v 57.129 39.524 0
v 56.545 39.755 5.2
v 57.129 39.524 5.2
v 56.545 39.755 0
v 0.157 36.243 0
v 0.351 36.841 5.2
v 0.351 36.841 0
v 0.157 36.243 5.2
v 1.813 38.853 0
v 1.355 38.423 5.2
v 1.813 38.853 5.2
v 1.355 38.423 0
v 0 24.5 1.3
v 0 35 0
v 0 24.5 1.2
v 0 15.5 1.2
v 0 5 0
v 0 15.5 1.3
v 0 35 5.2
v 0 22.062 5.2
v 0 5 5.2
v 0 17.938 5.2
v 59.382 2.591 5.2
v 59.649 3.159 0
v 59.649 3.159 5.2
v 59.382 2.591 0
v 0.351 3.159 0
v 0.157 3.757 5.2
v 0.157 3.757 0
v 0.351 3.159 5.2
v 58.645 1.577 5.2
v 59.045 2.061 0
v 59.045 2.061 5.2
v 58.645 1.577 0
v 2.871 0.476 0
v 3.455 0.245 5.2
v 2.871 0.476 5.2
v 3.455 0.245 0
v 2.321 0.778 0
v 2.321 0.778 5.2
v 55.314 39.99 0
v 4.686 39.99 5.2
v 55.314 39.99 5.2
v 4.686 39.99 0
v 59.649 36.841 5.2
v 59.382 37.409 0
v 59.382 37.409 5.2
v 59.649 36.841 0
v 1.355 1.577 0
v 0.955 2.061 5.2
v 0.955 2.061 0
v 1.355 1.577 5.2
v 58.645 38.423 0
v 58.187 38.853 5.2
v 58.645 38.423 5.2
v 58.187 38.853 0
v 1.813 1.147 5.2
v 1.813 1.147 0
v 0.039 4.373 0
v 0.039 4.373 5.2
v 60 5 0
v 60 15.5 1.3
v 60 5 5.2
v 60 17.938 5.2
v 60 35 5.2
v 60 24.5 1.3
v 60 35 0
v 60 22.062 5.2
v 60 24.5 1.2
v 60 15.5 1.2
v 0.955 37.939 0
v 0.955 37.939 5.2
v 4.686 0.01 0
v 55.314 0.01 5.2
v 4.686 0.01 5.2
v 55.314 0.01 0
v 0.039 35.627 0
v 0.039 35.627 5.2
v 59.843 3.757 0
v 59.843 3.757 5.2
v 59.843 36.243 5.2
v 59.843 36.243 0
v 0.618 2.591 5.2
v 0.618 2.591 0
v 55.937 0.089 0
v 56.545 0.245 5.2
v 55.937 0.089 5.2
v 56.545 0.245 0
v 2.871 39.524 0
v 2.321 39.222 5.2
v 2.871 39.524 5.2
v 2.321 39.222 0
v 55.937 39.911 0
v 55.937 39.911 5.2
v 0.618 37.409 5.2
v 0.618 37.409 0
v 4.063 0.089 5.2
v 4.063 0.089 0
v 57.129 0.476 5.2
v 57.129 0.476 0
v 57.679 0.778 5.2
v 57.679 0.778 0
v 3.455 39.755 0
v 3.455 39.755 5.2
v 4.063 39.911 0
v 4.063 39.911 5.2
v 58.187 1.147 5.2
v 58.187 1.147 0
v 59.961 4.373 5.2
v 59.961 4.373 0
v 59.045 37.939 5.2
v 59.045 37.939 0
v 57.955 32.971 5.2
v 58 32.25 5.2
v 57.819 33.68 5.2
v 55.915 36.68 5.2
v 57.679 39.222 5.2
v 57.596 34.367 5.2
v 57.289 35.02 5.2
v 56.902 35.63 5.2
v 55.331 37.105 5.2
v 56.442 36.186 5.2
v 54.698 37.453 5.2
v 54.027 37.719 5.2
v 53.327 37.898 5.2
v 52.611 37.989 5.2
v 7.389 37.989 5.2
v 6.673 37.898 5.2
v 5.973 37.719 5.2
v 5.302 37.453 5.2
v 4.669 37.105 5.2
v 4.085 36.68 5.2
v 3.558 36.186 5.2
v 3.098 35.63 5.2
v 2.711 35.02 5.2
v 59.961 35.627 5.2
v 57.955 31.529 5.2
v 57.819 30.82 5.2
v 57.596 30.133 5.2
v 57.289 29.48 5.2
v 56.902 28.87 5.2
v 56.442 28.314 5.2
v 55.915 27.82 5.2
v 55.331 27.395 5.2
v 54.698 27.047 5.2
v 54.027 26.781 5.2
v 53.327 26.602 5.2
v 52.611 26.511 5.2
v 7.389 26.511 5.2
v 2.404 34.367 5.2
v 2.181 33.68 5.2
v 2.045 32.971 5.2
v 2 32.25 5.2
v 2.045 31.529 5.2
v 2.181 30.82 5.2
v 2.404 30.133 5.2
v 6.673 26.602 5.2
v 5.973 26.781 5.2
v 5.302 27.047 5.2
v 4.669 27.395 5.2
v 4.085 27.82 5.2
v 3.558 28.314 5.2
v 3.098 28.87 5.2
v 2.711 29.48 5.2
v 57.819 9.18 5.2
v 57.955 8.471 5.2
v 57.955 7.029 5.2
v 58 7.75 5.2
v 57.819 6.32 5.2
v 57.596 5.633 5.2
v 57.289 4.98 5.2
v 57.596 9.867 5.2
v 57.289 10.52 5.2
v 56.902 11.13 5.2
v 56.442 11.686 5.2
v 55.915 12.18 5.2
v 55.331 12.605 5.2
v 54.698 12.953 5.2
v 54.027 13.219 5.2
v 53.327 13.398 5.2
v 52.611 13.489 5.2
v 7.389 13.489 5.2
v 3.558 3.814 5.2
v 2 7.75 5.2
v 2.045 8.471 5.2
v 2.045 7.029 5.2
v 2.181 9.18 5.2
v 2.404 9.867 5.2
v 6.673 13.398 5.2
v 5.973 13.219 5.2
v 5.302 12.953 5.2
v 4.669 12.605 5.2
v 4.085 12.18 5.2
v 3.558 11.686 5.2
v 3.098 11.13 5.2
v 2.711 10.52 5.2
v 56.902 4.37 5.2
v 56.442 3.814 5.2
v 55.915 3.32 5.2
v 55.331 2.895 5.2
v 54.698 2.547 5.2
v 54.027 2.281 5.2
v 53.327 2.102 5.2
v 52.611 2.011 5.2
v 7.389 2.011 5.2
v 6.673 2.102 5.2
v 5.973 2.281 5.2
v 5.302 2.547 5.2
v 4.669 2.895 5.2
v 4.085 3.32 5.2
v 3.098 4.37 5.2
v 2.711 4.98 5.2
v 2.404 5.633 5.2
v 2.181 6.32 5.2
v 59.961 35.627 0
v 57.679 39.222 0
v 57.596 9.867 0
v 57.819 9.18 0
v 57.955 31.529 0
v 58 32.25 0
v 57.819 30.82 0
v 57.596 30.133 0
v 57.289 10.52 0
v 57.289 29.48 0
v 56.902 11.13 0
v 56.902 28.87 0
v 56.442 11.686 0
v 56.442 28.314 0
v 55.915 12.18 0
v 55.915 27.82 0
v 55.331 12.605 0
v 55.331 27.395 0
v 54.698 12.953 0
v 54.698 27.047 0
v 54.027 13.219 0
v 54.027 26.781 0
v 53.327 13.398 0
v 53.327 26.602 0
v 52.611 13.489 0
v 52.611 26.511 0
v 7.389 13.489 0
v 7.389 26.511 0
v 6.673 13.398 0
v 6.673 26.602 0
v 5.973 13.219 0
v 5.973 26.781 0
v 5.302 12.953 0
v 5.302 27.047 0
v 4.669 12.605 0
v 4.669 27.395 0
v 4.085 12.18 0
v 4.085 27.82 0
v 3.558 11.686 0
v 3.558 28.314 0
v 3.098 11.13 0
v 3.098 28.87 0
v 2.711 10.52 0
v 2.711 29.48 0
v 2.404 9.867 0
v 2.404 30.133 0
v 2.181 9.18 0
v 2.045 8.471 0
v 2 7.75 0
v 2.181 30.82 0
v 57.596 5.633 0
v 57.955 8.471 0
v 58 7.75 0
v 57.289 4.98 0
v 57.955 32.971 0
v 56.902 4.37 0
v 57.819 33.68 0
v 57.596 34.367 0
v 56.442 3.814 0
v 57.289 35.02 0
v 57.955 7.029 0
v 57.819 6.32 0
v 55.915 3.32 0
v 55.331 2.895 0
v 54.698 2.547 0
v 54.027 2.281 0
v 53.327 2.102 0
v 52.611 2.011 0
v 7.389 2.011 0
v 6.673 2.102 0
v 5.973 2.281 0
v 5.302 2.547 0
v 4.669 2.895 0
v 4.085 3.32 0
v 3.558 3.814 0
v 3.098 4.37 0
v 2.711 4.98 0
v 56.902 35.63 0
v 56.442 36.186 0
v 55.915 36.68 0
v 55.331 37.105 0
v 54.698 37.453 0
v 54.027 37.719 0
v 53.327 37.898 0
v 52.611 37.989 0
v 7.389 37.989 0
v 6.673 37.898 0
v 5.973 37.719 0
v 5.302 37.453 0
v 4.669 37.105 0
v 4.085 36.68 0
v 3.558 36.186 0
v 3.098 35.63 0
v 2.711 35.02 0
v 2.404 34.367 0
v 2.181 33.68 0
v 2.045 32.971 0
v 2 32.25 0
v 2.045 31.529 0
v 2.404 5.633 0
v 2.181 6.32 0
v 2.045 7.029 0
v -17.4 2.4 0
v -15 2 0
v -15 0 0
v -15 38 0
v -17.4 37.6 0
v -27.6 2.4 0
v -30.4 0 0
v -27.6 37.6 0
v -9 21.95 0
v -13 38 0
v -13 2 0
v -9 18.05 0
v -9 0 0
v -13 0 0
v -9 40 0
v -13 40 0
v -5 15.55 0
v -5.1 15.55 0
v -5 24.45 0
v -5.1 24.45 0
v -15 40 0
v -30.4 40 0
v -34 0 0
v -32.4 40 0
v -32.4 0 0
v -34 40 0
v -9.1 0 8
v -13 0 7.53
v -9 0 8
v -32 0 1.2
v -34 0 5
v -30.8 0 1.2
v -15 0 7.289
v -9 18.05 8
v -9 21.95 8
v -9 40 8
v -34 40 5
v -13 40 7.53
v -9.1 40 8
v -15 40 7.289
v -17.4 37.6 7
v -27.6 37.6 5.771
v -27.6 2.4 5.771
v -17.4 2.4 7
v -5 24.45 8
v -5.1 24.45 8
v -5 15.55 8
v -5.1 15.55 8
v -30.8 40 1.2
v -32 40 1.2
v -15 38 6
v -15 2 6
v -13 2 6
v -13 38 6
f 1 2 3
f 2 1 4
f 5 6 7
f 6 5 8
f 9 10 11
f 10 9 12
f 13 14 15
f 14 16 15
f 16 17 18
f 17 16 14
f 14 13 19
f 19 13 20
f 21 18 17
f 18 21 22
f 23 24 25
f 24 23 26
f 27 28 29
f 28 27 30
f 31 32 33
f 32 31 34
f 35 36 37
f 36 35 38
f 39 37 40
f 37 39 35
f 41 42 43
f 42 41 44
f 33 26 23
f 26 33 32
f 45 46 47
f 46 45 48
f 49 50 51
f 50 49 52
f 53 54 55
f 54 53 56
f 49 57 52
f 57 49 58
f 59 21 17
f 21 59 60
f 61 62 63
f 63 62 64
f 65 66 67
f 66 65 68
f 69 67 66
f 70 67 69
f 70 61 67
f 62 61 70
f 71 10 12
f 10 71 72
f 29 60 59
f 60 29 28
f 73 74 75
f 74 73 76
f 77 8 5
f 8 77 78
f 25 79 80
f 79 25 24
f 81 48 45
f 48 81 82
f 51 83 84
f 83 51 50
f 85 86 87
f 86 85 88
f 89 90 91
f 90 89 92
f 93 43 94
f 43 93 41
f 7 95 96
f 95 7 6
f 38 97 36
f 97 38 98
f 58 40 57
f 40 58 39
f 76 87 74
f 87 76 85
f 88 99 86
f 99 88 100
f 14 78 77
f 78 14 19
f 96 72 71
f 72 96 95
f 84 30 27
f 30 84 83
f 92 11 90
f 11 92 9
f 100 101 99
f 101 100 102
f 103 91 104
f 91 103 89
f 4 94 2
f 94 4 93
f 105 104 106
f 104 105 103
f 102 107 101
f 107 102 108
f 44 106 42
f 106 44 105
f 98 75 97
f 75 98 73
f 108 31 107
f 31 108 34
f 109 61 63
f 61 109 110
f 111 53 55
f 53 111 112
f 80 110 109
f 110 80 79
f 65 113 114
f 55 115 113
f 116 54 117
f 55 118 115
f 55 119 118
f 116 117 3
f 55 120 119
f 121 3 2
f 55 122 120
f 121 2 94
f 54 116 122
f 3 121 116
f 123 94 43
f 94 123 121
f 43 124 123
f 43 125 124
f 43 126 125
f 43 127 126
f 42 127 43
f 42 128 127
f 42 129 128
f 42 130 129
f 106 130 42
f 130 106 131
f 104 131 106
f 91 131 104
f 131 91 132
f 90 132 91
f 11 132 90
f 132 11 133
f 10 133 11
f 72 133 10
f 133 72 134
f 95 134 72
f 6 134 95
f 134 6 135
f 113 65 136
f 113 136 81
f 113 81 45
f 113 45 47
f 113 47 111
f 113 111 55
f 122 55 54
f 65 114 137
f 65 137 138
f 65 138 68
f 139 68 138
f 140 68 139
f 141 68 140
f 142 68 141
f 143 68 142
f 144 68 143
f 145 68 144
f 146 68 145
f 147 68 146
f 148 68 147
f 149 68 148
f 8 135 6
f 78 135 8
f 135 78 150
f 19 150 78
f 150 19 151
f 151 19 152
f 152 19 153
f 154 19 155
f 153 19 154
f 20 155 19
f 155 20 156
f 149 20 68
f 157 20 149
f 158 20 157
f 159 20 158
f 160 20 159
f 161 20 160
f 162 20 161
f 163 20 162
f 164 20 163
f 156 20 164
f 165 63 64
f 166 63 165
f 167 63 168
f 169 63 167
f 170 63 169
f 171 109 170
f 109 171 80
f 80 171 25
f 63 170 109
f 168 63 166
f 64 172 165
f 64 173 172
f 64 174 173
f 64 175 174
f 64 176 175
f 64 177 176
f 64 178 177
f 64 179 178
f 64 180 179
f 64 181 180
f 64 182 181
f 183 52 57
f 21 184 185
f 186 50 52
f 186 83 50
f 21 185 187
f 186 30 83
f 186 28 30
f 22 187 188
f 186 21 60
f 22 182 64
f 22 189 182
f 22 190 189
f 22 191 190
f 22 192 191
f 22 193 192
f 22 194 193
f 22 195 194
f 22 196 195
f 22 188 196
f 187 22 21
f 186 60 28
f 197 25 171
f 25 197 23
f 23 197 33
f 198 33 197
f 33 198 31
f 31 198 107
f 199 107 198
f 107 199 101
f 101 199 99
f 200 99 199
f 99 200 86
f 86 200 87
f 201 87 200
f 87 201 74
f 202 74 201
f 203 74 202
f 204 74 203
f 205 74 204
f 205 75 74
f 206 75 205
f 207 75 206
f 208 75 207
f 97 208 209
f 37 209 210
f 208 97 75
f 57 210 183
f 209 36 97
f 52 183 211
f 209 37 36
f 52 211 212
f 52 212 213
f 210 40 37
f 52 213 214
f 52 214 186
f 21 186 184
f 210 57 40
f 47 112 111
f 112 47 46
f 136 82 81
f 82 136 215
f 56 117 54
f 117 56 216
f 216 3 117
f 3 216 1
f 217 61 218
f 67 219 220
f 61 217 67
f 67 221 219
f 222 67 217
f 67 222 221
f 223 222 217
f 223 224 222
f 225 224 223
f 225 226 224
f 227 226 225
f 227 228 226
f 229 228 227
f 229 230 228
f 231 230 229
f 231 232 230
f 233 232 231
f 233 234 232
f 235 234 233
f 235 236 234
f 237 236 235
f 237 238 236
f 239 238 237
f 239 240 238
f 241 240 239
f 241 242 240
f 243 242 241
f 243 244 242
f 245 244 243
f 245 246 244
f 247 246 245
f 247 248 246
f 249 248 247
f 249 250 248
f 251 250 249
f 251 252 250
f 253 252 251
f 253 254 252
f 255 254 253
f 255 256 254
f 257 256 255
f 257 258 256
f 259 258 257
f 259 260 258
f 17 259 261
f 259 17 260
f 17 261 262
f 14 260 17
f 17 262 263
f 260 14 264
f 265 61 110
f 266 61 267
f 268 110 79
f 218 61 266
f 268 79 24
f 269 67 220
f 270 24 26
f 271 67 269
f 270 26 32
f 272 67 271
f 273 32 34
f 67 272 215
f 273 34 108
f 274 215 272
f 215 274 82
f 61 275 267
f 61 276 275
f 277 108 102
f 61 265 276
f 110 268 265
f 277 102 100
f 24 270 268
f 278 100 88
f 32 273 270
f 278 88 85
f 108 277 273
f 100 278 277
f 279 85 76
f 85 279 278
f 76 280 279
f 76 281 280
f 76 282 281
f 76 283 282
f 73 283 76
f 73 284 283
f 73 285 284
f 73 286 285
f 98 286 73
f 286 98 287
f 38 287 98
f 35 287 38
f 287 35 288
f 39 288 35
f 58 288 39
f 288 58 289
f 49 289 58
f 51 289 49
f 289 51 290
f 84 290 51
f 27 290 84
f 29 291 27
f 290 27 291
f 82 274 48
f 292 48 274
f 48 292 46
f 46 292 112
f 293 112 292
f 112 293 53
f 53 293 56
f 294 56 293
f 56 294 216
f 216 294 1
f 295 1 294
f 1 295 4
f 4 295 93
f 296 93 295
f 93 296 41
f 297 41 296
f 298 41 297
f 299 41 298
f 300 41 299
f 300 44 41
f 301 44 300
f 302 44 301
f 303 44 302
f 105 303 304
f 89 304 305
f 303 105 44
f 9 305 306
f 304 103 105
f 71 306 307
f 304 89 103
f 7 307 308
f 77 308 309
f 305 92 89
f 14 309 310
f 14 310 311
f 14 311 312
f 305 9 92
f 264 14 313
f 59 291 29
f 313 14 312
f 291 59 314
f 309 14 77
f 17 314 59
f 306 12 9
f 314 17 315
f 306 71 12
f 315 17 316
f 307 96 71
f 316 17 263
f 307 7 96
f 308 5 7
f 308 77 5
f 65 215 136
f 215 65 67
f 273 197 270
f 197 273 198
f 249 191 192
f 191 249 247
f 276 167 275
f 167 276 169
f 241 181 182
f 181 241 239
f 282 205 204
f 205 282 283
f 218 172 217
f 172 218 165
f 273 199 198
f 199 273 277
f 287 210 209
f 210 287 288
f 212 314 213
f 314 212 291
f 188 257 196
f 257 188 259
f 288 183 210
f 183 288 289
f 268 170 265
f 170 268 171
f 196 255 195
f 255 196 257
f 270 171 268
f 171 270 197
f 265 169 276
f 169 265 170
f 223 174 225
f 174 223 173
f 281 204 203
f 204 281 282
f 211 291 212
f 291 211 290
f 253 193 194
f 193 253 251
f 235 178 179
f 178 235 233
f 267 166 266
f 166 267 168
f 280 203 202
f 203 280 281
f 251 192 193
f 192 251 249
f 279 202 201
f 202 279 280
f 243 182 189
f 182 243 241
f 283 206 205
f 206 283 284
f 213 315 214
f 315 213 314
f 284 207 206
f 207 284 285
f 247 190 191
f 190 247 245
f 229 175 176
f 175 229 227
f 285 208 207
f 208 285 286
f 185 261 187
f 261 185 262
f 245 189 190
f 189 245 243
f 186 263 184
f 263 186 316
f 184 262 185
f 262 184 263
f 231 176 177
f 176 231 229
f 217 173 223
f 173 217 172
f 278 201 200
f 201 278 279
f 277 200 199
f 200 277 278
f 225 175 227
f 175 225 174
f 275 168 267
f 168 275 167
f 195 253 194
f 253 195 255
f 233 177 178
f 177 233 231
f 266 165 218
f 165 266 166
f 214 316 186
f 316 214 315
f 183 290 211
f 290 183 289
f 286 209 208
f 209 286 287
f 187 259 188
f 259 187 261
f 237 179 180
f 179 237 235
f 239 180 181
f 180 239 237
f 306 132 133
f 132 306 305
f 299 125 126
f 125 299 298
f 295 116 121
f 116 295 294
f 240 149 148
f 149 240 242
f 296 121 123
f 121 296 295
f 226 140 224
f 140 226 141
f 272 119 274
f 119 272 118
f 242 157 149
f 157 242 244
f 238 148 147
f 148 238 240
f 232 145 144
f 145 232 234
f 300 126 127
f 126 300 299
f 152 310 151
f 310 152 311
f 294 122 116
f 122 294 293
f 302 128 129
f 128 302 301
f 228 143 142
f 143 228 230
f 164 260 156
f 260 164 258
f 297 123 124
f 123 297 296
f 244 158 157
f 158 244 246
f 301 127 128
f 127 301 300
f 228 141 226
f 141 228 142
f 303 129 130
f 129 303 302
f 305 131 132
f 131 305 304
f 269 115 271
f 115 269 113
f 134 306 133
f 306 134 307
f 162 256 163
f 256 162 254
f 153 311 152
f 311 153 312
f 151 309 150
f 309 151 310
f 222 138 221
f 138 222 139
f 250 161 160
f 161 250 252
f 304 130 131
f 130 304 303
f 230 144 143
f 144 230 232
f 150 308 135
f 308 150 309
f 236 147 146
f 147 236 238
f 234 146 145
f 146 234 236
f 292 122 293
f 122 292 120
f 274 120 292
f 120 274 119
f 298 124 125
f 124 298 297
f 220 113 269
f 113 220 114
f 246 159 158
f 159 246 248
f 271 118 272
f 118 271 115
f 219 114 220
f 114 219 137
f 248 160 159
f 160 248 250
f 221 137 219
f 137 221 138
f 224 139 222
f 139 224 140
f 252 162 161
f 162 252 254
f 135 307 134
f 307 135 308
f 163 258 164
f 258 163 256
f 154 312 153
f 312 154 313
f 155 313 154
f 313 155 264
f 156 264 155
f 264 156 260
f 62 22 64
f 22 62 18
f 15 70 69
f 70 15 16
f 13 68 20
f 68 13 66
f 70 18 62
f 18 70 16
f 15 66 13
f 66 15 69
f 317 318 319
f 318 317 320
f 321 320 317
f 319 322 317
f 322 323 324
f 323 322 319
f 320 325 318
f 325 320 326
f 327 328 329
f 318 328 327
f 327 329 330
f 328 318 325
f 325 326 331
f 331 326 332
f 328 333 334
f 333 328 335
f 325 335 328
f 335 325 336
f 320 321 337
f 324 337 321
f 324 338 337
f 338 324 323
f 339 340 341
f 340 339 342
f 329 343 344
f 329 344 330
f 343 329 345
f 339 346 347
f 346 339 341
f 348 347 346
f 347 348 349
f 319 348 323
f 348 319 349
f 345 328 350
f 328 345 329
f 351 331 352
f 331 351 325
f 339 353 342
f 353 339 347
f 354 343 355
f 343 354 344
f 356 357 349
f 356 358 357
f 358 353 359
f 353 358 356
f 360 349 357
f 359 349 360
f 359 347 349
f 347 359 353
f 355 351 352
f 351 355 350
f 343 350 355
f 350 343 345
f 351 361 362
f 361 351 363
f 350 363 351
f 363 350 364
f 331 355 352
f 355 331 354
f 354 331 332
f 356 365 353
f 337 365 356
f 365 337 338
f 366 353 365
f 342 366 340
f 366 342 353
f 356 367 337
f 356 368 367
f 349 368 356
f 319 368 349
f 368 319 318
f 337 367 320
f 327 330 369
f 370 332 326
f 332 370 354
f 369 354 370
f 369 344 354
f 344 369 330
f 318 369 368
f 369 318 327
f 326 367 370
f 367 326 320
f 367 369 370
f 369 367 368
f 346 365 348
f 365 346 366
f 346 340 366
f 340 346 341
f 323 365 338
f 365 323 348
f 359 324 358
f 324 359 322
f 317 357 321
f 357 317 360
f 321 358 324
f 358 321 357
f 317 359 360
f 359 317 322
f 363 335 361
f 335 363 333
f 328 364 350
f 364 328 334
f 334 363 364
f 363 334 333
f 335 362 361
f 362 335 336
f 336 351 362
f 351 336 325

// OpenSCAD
part = "both"; // [bottom, block, both]
// Length of the base
length = 60;
// Width of the base
width = 40;
// Bottom thickness
bottom = 1.2;
// Roundness of the corners
roundness = 5;

/* [Slot] */
// Top width of the slot
slotTop = 4;
// Bottom width of the slot
slotBottom = 9;
// Height of the slot
slotHeight = 4;
// Tolerance for the slot (adjust in case it does not slide properly)
slotTolerance = 0.1;
// Padding around the slot before the cutout starts
slotPadding = 2;
// Walls on the outside before the cutout starts
walls = 2;

/* [Block] */
// Height of the block
holderHeight = 25;
// Top thickness of the block
holderThickness = 5;
// Bottom thickness of the block
holderThicknessBottom = 8;
// Padding for the cutout
holderPadding = 2.4;
// Depth for the rubber band slot
bandSlotDepth = 2;
// Height of the slot for the rubber band
bandSlotHeight = 2;
// Z Offset for the rubber band sllot
bandSlotOffsetZ = 4;
// Z Top Offset for the PCB slot
pcbOffsetZ = 2;
// Height of the cutout for the PCB
heightPcb = 1.2;
// Depth of the cutout for the PCB
depthPcb = 1.2;
// Outer height of the cutout for the PCB
heightPcbOuter = 2;

/* [Hidden] */
$fn = 50;
height = slotHeight + bottom;
cutoutDiameter = (width - slotBottom - slotPadding * 2 - walls * 2) / 2;
cutoutRadius = cutoutDiameter / 2;

if(part == "bottom") {
  bottom();
}
if(part == "block") {
  rotate([0, -90, 0])
    holder();
}
if(part == "both") {
  bottom();
  translate([-slotHeight - 5, 0, 0])
    rotate([0, -90, 0])
      holder();
}

module sled() {
  slotTopInner = slotTop - slotTolerance;
  slotBottomInner = slotBottom - slotTolerance;
  
  difference() {
    hull() {
      translate([0, -slotTopInner / 2, -0.1])
        cube([holderThicknessBottom, slotTopInner, 0.1]);
      
      translate([0, -slotBottomInner / 2, -slotHeight])
        cube([holderThicknessBottom, slotBottomInner, 0.1]);
    }
  
    translate([-1, -slotBottomInner / 2 - 1, -slotHeight - (slotTolerance * 2 + slotTolerance / 2)])
      cube([holderThicknessBottom + 2, slotBottomInner + 2, slotTolerance * 2]);
  }
}

module holder() {
  difference() {
    hull() {
      cube([holderThicknessBottom, width, 0.1]);
      translate([0, 0, holderHeight - 0.1])
        cube([holderThickness, width, 0.1]);
    }
    
    translate([-1, -1, bandSlotOffsetZ])
      cube([holderThicknessBottom + 2, bandSlotDepth+1, bandSlotHeight]);
    translate([-1, width - bandSlotDepth, bandSlotOffsetZ])
      cube([holderThicknessBottom + 2, bandSlotDepth+1, bandSlotHeight]);
    translate([holderThicknessBottom - bandSlotDepth, -1, bandSlotOffsetZ])
      cube([bandSlotDepth+1, width + 2, bandSlotHeight]);
    
    hull() {
      translate([depthPcb - 0.1, -1, holderHeight - pcbOffsetZ - heightPcb])
        cube([0.1, width + 2, heightPcb]);
      translate([-0.1, -1, holderHeight - pcbOffsetZ -heightPcb - (heightPcbOuter - heightPcb) / 2])
        cube([0.1, width + 2, heightPcbOuter]); 
    }
    
    translate([-1, holderPadding, bandSlotOffsetZ + bandSlotHeight + holderPadding])
    cube([holderThicknessBottom + 2, width - holderPadding * 2, holderHeight - (bandSlotOffsetZ + bandSlotHeight + holderPadding * 2 + pcbOffsetZ + heightPcbOuter)]);
  }
  
  translate([0, width / 2, 0])
    sled();
}

module bottom() {
  difference() {
    hull() {
      translate([roundness, roundness, 0])
        cylinder(r= roundness, h = height);
      translate([length - roundness, roundness, 0])
        cylinder(r= roundness, h = height);
      
      translate([roundness, width - roundness, 0])
        cylinder(r= roundness, h = height);
      translate([length - roundness, width - roundness, 0])
        cylinder(r= roundness, h = height);
    }
    
    hull() {
      translate([cutoutRadius + walls, cutoutRadius + walls, -1])
        cylinder(r= cutoutRadius, h = height + 2);
      translate([length - (cutoutRadius + walls), cutoutRadius + walls, -1])
        cylinder(r= cutoutRadius, h = height + 2);
    }
    
    hull() {
      translate([cutoutRadius + walls, width - (cutoutRadius + walls), -1])
        cylinder(r= cutoutRadius, h = height + 2);
      translate([length - (cutoutRadius + walls), width - (cutoutRadius + walls), -1])
        cylinder(r= cutoutRadius, h = height + 2);
    }

    hull() {
      translate([-1, width / 2 - slotBottom / 2, bottom])
        cube([length + 2, slotBottom, 0.1]);

      translate([-1, width / 2 - slotTop / 2, height])
        cube([length + 2, slotTop, 0.1]);
    }
  }
}
